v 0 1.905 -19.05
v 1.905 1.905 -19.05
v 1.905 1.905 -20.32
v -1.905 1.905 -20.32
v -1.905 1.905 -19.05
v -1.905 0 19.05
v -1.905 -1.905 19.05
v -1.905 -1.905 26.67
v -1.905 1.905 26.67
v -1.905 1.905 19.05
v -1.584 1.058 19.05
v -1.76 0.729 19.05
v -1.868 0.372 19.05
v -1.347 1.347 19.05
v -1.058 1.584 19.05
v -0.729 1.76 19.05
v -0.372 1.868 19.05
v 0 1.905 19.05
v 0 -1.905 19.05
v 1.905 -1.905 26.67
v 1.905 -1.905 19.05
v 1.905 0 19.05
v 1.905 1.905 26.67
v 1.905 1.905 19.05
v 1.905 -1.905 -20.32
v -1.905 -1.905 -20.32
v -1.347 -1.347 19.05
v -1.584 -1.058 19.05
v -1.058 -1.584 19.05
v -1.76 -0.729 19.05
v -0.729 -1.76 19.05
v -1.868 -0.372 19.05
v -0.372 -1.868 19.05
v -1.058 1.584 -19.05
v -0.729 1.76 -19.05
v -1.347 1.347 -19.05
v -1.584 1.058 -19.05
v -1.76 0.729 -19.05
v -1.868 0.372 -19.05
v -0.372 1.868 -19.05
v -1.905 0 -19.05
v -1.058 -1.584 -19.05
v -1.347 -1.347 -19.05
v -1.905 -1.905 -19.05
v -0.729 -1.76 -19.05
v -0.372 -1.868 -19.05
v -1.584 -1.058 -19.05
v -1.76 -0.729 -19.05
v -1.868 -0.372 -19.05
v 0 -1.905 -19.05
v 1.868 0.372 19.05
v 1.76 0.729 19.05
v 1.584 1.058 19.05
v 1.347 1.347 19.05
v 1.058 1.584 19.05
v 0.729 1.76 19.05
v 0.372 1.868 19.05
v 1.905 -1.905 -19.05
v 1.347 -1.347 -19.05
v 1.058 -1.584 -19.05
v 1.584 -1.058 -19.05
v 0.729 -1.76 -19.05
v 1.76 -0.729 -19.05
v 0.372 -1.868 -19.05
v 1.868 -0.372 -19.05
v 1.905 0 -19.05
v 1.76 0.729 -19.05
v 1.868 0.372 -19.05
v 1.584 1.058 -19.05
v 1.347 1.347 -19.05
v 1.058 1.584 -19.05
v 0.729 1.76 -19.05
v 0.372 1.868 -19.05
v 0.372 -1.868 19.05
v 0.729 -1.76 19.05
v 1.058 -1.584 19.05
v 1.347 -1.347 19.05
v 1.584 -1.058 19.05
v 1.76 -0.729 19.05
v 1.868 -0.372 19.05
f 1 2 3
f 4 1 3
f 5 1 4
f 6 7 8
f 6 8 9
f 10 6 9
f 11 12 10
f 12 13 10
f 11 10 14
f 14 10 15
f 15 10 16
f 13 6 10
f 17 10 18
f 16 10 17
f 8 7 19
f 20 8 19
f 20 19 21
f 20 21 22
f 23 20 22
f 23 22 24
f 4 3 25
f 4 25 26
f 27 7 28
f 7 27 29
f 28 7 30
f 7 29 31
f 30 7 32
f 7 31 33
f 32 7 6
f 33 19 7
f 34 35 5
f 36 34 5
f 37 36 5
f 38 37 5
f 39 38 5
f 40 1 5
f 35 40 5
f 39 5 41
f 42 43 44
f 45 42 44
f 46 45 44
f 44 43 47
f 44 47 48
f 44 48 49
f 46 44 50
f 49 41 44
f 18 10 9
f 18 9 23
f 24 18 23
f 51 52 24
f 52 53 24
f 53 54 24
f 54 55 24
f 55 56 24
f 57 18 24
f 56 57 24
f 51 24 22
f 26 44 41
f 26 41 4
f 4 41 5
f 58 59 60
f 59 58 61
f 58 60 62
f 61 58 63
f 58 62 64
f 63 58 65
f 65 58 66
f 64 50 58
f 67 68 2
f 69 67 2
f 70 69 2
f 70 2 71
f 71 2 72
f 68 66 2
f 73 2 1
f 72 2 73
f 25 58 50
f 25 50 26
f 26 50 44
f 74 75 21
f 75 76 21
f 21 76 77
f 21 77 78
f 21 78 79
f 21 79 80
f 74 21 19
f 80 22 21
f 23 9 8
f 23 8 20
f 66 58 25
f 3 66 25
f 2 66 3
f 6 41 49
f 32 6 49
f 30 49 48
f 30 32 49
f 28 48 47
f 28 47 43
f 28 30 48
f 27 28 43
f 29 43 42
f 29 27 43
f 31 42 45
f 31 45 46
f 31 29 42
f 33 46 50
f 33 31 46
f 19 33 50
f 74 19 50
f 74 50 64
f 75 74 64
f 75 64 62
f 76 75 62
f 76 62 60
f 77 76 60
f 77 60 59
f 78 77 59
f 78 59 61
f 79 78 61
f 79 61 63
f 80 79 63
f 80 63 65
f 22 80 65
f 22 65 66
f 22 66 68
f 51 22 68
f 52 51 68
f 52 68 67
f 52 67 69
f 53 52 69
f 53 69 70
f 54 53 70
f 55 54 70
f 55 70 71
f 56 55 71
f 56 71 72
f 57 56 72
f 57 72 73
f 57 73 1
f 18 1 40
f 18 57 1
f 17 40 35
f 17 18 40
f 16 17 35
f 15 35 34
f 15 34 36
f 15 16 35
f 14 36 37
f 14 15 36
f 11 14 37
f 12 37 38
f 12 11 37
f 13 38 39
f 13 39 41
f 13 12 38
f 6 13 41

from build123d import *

# Parameters (mm, degrees)
SKETCH1_R           = 1.905
BOSS_EXTRUDE1_DEPTH = 19.05
SKETCH2_W           = 3.81
SKETCH2_H           = 3.81
BOSS_EXTRUDE2_DEPTH = 7.62
SKETCH3_W           = 3.81
SKETCH3_H           = 3.81
BOSS_EXTRUDE3_DEPTH = 1.27


with BuildPart() as part:
    # Sketch1 → Boss-Extrude1 (new, symmetric)
    with BuildSketch(Plane.XY):
        with Locations(Location((0, 0, 0), (0, 0, 180))):
            Circle(SKETCH1_R)
    extrude(amount=BOSS_EXTRUDE1_DEPTH, both=True)

    # Sketch2 → Boss-Extrude2 (add)
    with BuildSketch(Plane.XY.offset(19.05)):
        Rectangle(SKETCH2_W, SKETCH2_H)
    extrude(amount=BOSS_EXTRUDE2_DEPTH)

    # Sketch3 → Boss-Extrude3 (add)
    with BuildSketch(Plane(origin=(0, 0, -19.05), x_dir=(-1, 0, 0), z_dir=(0, 0, -1))):
        Rectangle(SKETCH3_W, SKETCH3_H)
    extrude(amount=BOSS_EXTRUDE3_DEPTH)


solid = part.part
